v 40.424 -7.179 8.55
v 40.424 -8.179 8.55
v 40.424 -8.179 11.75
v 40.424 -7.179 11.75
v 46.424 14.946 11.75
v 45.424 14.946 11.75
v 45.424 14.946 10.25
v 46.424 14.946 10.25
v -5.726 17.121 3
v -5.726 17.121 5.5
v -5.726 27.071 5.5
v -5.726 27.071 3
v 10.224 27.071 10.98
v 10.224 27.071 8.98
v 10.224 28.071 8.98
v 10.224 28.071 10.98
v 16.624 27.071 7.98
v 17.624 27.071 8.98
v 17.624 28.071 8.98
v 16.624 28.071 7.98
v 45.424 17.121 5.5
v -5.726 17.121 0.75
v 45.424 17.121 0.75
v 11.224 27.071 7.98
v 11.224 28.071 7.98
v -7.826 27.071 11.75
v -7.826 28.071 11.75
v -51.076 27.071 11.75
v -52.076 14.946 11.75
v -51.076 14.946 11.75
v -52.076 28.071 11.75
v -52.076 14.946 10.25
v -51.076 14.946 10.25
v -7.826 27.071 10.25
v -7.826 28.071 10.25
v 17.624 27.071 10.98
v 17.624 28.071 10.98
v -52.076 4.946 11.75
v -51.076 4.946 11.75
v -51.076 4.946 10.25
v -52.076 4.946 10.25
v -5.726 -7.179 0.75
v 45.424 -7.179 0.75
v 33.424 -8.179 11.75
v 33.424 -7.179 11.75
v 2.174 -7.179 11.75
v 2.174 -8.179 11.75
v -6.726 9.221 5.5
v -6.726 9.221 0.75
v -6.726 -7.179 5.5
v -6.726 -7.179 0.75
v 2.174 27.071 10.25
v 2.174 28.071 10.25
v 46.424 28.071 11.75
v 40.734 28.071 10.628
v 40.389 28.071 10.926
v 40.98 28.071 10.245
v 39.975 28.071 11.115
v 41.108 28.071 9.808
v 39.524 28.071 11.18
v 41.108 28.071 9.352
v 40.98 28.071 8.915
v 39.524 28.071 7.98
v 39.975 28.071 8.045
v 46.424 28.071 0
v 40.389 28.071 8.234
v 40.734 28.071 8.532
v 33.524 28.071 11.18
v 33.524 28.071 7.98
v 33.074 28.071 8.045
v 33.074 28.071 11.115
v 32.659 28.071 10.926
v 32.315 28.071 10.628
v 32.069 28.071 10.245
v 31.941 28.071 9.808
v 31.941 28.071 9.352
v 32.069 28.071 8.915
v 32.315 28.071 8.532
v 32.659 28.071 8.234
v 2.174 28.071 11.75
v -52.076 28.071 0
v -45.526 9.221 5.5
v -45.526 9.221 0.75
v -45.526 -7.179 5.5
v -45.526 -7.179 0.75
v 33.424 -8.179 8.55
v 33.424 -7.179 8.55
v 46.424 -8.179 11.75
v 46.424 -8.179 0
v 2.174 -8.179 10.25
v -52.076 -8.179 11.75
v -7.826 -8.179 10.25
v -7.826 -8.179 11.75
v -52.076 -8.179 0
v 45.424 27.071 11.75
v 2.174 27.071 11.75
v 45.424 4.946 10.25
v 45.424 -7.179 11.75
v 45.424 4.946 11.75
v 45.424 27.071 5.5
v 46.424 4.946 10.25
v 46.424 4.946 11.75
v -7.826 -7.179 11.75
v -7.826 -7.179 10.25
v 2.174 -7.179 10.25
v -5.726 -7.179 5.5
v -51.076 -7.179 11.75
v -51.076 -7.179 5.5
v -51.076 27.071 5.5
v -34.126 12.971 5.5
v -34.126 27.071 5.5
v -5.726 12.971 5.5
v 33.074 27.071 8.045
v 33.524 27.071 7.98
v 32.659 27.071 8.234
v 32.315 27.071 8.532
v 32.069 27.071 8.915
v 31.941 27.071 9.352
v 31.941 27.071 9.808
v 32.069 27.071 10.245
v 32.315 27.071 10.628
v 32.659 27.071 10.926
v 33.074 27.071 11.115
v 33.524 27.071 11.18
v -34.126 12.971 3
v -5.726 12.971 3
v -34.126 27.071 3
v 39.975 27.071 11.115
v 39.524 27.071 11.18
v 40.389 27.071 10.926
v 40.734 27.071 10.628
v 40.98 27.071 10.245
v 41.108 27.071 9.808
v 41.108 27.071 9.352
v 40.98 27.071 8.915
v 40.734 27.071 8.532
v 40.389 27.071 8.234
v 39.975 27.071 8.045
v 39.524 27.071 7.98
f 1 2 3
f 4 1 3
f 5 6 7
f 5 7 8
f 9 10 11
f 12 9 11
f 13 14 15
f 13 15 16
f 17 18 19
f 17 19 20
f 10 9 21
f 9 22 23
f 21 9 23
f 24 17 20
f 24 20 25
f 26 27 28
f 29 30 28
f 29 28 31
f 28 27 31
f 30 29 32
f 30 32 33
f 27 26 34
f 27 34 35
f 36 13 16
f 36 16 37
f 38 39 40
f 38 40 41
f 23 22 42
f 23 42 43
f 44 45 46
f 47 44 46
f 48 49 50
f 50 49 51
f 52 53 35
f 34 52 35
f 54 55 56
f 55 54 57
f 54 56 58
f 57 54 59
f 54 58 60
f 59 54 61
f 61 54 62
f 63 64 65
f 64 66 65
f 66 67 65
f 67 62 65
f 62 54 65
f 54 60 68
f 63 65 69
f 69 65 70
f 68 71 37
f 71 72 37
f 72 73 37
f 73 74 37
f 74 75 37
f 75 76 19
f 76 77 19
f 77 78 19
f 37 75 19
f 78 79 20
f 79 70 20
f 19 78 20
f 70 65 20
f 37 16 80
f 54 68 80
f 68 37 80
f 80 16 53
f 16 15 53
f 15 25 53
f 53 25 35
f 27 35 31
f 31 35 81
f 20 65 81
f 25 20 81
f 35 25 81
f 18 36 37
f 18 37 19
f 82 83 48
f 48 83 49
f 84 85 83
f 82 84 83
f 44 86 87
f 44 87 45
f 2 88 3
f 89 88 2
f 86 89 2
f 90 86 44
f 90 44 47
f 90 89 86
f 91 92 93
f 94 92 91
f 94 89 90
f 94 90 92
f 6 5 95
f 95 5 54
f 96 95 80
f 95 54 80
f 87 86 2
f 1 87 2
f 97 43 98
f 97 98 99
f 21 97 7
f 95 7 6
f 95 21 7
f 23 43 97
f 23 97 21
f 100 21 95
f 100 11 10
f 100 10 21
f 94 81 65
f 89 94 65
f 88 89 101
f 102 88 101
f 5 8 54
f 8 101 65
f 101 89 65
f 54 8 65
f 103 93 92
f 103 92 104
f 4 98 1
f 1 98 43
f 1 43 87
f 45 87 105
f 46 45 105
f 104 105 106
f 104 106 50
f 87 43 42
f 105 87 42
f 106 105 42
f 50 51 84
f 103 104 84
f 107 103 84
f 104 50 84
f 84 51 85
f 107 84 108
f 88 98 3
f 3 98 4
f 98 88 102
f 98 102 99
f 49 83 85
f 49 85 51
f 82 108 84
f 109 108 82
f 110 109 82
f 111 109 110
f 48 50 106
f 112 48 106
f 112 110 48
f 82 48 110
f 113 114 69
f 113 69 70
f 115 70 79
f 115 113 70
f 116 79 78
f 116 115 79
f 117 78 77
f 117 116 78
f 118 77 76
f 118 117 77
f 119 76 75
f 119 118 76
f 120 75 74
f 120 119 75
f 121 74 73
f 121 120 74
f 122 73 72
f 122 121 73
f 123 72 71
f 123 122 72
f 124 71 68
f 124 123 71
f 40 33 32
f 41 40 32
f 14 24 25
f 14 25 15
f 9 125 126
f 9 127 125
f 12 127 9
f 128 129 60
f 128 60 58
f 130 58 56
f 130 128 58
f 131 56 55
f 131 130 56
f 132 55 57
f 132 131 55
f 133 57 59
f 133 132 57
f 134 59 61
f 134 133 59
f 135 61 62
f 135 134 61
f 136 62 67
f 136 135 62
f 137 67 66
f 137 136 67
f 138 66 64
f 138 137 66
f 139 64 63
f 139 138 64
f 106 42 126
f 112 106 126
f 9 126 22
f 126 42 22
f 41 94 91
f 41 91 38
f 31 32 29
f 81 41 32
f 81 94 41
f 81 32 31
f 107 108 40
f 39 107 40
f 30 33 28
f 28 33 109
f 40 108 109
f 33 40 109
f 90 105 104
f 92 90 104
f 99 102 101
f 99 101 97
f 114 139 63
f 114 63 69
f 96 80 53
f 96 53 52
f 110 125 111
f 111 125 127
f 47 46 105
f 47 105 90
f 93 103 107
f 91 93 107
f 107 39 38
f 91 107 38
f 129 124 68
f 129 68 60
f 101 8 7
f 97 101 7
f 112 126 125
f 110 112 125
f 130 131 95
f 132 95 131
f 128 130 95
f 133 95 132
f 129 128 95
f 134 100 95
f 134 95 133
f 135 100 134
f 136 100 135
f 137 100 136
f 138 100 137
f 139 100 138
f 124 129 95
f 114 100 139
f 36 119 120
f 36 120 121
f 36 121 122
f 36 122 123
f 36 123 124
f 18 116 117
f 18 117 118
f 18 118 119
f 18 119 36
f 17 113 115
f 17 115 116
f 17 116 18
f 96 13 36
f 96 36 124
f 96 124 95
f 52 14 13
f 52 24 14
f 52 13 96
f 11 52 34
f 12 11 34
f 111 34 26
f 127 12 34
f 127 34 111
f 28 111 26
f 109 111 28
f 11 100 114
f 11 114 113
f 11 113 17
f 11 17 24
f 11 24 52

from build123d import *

# Parameters (mm, degrees)
CROQUIS1_W              = 96.5
CROQUIS1_H              = 34.25
SALIENTE_EXTRUIR1_DEPTH = 0.75
CROQUIS3_W              = 98.5
CROQUIS3_H              = 36.25
CROQUIS3_W_2            = 96.5
CROQUIS3_H_2            = 34.25
SALIENTE_EXTRUIR2_DEPTH = 11.75
SALIENTE_EXTRUIR3_DEPTH = 4.75
SALIENTE_EXTRUIR4_DEPTH = 3
SALIENTE_EXTRUIR5_DEPTH = 2.5
CROQUIS8_W              = 1
CROQUIS8_H              = 14.1
CORTAR_EXTRUIR1_DEPTH   = 2.5
CORTAR_EXTRUIR2_DEPTH   = 2.5
CORTAR_EXTRUIR3_DEPTH   = 1.5
CROQUIS11_W             = 7
CROQUIS11_H             = 3.2
CORTAR_EXTRUIR4_DEPTH   = 10


with BuildPart() as part:
    # Croquis1 → Saliente-Extruir1 (new body)
    with BuildSketch(Plane.XY):
        with Locations((-2.825600583, 9.945957096)):
            Rectangle(CROQUIS1_W, CROQUIS1_H)
    extrude(amount=SALIENTE_EXTRUIR1_DEPTH)

    # Croquis3 → Saliente-Extruir2 (add)
    with BuildSketch(Plane(origin=(0, 0, 0), x_dir=(-1, 0, 0), z_dir=(0, 0, -1))):
        with Locations((2.825600583, 9.945957096)):
            Rectangle(CROQUIS3_W, CROQUIS3_H)
        with Locations((2.825600583, 9.945957096)):
            Rectangle(CROQUIS3_W_2, CROQUIS3_H_2, mode=Mode.SUBTRACT)
    extrude(amount=-SALIENTE_EXTRUIR2_DEPTH)

    # Croquis5 → Saliente-Extruir3 (add)
    with BuildSketch(Plane.XY.offset(0.75)):
        Polygon((-5.725600583, -7.179042904), (-5.725600583, 17.120957096), (45.424399417, 17.120957096), (45.424399417, 27.070957096), (-6.725600583, 27.070957096), (-6.725600583, -7.179042904), align=None)
    extrude(amount=SALIENTE_EXTRUIR3_DEPTH)

    # Croquis6 → Saliente-Extruir4 (add)
    with BuildSketch(Plane.XY):
        Polygon((-6.725600583, 9.220957096), (-6.725600583, 27.070957096), (-51.075600583, 27.070957096), (-51.075600583, -7.179042904), (-45.525600583, -7.179042904), (-45.525600583, 9.220957096), align=None)
    extrude(amount=SALIENTE_EXTRUIR4_DEPTH)

    # Croquis7 → Saliente-Extruir5 (add)
    with BuildSketch(Plane.XY.offset(3)):
        Polygon((-34.125600583, 27.070957096), (-51.075600583, 27.070957096), (-51.075600583, -7.179042904), (-45.525600583, -7.179042904), (-45.525600583, 9.220957096), (-6.725600583, 9.220957096), (-6.725600583, 12.970957096), (-34.125600583, 12.970957096), align=None)
    extrude(amount=SALIENTE_EXTRUIR5_DEPTH)

    # Croquis8 → Cortar-Extruir1 (cut)
    with BuildSketch(Plane.XY.offset(5.5)):
        with Locations((-6.225600583, 20.020957096)):
            Rectangle(CROQUIS8_W, CROQUIS8_H)
    extrude(amount=-CORTAR_EXTRUIR1_DEPTH, mode=Mode.SUBTRACT)

    # Croquis9 → Cortar-Extruir2 (cut)
    with BuildSketch(Plane.XZ.offset(-27.070957096)):
        Polygon((10.224399417, 10.98), (17.624399417, 10.98), (17.624399417, 8.98), (16.624399417, 7.98), (11.224399417, 7.98), (10.224399417, 8.98), align=None)
        with BuildLine():
            Line((33.524399417, 11.18), (39.524399417, 11.18))
            ThreePointArc((39.524399417, 11.18), (41.124399417, 9.58), (39.524399417, 7.98))
            Line((39.524399417, 7.98), (33.524399417, 7.98))
            ThreePointArc((33.524399417, 7.98), (31.924399417, 9.58), (33.524399417, 11.18))
        make_face()
    extrude(amount=-CORTAR_EXTRUIR2_DEPTH, mode=Mode.SUBTRACT)

    # Croquis10 → Cortar-Extruir3 (cut)
    with BuildSketch(Plane.XY.offset(11.75)):
        Polygon((-7.825600583, 36.220855399), (2.174399417, 36.220855399), (2.174399417, 14.945957096), (54.759857348, 14.945957096), (54.759857348, 4.945957096), (2.174399417, 4.945957096), (2.174399417, -27.159073942), (-7.825600583, -27.159073942), (-7.825600583, 4.945957096), (-73.50393186, 4.945957096), (-73.50393186, 14.945957096), (-7.825600583, 14.945957096), align=None)
    extrude(amount=-CORTAR_EXTRUIR3_DEPTH, mode=Mode.SUBTRACT)

    # Croquis11 → Cortar-Extruir4 (cut)
    with BuildSketch(Plane.XZ.offset(8.179042904)):
        with Locations((36.924399417, 10.15)):
            Rectangle(CROQUIS11_W, CROQUIS11_H)
    extrude(amount=-CORTAR_EXTRUIR4_DEPTH, mode=Mode.SUBTRACT)


solid = part.part
